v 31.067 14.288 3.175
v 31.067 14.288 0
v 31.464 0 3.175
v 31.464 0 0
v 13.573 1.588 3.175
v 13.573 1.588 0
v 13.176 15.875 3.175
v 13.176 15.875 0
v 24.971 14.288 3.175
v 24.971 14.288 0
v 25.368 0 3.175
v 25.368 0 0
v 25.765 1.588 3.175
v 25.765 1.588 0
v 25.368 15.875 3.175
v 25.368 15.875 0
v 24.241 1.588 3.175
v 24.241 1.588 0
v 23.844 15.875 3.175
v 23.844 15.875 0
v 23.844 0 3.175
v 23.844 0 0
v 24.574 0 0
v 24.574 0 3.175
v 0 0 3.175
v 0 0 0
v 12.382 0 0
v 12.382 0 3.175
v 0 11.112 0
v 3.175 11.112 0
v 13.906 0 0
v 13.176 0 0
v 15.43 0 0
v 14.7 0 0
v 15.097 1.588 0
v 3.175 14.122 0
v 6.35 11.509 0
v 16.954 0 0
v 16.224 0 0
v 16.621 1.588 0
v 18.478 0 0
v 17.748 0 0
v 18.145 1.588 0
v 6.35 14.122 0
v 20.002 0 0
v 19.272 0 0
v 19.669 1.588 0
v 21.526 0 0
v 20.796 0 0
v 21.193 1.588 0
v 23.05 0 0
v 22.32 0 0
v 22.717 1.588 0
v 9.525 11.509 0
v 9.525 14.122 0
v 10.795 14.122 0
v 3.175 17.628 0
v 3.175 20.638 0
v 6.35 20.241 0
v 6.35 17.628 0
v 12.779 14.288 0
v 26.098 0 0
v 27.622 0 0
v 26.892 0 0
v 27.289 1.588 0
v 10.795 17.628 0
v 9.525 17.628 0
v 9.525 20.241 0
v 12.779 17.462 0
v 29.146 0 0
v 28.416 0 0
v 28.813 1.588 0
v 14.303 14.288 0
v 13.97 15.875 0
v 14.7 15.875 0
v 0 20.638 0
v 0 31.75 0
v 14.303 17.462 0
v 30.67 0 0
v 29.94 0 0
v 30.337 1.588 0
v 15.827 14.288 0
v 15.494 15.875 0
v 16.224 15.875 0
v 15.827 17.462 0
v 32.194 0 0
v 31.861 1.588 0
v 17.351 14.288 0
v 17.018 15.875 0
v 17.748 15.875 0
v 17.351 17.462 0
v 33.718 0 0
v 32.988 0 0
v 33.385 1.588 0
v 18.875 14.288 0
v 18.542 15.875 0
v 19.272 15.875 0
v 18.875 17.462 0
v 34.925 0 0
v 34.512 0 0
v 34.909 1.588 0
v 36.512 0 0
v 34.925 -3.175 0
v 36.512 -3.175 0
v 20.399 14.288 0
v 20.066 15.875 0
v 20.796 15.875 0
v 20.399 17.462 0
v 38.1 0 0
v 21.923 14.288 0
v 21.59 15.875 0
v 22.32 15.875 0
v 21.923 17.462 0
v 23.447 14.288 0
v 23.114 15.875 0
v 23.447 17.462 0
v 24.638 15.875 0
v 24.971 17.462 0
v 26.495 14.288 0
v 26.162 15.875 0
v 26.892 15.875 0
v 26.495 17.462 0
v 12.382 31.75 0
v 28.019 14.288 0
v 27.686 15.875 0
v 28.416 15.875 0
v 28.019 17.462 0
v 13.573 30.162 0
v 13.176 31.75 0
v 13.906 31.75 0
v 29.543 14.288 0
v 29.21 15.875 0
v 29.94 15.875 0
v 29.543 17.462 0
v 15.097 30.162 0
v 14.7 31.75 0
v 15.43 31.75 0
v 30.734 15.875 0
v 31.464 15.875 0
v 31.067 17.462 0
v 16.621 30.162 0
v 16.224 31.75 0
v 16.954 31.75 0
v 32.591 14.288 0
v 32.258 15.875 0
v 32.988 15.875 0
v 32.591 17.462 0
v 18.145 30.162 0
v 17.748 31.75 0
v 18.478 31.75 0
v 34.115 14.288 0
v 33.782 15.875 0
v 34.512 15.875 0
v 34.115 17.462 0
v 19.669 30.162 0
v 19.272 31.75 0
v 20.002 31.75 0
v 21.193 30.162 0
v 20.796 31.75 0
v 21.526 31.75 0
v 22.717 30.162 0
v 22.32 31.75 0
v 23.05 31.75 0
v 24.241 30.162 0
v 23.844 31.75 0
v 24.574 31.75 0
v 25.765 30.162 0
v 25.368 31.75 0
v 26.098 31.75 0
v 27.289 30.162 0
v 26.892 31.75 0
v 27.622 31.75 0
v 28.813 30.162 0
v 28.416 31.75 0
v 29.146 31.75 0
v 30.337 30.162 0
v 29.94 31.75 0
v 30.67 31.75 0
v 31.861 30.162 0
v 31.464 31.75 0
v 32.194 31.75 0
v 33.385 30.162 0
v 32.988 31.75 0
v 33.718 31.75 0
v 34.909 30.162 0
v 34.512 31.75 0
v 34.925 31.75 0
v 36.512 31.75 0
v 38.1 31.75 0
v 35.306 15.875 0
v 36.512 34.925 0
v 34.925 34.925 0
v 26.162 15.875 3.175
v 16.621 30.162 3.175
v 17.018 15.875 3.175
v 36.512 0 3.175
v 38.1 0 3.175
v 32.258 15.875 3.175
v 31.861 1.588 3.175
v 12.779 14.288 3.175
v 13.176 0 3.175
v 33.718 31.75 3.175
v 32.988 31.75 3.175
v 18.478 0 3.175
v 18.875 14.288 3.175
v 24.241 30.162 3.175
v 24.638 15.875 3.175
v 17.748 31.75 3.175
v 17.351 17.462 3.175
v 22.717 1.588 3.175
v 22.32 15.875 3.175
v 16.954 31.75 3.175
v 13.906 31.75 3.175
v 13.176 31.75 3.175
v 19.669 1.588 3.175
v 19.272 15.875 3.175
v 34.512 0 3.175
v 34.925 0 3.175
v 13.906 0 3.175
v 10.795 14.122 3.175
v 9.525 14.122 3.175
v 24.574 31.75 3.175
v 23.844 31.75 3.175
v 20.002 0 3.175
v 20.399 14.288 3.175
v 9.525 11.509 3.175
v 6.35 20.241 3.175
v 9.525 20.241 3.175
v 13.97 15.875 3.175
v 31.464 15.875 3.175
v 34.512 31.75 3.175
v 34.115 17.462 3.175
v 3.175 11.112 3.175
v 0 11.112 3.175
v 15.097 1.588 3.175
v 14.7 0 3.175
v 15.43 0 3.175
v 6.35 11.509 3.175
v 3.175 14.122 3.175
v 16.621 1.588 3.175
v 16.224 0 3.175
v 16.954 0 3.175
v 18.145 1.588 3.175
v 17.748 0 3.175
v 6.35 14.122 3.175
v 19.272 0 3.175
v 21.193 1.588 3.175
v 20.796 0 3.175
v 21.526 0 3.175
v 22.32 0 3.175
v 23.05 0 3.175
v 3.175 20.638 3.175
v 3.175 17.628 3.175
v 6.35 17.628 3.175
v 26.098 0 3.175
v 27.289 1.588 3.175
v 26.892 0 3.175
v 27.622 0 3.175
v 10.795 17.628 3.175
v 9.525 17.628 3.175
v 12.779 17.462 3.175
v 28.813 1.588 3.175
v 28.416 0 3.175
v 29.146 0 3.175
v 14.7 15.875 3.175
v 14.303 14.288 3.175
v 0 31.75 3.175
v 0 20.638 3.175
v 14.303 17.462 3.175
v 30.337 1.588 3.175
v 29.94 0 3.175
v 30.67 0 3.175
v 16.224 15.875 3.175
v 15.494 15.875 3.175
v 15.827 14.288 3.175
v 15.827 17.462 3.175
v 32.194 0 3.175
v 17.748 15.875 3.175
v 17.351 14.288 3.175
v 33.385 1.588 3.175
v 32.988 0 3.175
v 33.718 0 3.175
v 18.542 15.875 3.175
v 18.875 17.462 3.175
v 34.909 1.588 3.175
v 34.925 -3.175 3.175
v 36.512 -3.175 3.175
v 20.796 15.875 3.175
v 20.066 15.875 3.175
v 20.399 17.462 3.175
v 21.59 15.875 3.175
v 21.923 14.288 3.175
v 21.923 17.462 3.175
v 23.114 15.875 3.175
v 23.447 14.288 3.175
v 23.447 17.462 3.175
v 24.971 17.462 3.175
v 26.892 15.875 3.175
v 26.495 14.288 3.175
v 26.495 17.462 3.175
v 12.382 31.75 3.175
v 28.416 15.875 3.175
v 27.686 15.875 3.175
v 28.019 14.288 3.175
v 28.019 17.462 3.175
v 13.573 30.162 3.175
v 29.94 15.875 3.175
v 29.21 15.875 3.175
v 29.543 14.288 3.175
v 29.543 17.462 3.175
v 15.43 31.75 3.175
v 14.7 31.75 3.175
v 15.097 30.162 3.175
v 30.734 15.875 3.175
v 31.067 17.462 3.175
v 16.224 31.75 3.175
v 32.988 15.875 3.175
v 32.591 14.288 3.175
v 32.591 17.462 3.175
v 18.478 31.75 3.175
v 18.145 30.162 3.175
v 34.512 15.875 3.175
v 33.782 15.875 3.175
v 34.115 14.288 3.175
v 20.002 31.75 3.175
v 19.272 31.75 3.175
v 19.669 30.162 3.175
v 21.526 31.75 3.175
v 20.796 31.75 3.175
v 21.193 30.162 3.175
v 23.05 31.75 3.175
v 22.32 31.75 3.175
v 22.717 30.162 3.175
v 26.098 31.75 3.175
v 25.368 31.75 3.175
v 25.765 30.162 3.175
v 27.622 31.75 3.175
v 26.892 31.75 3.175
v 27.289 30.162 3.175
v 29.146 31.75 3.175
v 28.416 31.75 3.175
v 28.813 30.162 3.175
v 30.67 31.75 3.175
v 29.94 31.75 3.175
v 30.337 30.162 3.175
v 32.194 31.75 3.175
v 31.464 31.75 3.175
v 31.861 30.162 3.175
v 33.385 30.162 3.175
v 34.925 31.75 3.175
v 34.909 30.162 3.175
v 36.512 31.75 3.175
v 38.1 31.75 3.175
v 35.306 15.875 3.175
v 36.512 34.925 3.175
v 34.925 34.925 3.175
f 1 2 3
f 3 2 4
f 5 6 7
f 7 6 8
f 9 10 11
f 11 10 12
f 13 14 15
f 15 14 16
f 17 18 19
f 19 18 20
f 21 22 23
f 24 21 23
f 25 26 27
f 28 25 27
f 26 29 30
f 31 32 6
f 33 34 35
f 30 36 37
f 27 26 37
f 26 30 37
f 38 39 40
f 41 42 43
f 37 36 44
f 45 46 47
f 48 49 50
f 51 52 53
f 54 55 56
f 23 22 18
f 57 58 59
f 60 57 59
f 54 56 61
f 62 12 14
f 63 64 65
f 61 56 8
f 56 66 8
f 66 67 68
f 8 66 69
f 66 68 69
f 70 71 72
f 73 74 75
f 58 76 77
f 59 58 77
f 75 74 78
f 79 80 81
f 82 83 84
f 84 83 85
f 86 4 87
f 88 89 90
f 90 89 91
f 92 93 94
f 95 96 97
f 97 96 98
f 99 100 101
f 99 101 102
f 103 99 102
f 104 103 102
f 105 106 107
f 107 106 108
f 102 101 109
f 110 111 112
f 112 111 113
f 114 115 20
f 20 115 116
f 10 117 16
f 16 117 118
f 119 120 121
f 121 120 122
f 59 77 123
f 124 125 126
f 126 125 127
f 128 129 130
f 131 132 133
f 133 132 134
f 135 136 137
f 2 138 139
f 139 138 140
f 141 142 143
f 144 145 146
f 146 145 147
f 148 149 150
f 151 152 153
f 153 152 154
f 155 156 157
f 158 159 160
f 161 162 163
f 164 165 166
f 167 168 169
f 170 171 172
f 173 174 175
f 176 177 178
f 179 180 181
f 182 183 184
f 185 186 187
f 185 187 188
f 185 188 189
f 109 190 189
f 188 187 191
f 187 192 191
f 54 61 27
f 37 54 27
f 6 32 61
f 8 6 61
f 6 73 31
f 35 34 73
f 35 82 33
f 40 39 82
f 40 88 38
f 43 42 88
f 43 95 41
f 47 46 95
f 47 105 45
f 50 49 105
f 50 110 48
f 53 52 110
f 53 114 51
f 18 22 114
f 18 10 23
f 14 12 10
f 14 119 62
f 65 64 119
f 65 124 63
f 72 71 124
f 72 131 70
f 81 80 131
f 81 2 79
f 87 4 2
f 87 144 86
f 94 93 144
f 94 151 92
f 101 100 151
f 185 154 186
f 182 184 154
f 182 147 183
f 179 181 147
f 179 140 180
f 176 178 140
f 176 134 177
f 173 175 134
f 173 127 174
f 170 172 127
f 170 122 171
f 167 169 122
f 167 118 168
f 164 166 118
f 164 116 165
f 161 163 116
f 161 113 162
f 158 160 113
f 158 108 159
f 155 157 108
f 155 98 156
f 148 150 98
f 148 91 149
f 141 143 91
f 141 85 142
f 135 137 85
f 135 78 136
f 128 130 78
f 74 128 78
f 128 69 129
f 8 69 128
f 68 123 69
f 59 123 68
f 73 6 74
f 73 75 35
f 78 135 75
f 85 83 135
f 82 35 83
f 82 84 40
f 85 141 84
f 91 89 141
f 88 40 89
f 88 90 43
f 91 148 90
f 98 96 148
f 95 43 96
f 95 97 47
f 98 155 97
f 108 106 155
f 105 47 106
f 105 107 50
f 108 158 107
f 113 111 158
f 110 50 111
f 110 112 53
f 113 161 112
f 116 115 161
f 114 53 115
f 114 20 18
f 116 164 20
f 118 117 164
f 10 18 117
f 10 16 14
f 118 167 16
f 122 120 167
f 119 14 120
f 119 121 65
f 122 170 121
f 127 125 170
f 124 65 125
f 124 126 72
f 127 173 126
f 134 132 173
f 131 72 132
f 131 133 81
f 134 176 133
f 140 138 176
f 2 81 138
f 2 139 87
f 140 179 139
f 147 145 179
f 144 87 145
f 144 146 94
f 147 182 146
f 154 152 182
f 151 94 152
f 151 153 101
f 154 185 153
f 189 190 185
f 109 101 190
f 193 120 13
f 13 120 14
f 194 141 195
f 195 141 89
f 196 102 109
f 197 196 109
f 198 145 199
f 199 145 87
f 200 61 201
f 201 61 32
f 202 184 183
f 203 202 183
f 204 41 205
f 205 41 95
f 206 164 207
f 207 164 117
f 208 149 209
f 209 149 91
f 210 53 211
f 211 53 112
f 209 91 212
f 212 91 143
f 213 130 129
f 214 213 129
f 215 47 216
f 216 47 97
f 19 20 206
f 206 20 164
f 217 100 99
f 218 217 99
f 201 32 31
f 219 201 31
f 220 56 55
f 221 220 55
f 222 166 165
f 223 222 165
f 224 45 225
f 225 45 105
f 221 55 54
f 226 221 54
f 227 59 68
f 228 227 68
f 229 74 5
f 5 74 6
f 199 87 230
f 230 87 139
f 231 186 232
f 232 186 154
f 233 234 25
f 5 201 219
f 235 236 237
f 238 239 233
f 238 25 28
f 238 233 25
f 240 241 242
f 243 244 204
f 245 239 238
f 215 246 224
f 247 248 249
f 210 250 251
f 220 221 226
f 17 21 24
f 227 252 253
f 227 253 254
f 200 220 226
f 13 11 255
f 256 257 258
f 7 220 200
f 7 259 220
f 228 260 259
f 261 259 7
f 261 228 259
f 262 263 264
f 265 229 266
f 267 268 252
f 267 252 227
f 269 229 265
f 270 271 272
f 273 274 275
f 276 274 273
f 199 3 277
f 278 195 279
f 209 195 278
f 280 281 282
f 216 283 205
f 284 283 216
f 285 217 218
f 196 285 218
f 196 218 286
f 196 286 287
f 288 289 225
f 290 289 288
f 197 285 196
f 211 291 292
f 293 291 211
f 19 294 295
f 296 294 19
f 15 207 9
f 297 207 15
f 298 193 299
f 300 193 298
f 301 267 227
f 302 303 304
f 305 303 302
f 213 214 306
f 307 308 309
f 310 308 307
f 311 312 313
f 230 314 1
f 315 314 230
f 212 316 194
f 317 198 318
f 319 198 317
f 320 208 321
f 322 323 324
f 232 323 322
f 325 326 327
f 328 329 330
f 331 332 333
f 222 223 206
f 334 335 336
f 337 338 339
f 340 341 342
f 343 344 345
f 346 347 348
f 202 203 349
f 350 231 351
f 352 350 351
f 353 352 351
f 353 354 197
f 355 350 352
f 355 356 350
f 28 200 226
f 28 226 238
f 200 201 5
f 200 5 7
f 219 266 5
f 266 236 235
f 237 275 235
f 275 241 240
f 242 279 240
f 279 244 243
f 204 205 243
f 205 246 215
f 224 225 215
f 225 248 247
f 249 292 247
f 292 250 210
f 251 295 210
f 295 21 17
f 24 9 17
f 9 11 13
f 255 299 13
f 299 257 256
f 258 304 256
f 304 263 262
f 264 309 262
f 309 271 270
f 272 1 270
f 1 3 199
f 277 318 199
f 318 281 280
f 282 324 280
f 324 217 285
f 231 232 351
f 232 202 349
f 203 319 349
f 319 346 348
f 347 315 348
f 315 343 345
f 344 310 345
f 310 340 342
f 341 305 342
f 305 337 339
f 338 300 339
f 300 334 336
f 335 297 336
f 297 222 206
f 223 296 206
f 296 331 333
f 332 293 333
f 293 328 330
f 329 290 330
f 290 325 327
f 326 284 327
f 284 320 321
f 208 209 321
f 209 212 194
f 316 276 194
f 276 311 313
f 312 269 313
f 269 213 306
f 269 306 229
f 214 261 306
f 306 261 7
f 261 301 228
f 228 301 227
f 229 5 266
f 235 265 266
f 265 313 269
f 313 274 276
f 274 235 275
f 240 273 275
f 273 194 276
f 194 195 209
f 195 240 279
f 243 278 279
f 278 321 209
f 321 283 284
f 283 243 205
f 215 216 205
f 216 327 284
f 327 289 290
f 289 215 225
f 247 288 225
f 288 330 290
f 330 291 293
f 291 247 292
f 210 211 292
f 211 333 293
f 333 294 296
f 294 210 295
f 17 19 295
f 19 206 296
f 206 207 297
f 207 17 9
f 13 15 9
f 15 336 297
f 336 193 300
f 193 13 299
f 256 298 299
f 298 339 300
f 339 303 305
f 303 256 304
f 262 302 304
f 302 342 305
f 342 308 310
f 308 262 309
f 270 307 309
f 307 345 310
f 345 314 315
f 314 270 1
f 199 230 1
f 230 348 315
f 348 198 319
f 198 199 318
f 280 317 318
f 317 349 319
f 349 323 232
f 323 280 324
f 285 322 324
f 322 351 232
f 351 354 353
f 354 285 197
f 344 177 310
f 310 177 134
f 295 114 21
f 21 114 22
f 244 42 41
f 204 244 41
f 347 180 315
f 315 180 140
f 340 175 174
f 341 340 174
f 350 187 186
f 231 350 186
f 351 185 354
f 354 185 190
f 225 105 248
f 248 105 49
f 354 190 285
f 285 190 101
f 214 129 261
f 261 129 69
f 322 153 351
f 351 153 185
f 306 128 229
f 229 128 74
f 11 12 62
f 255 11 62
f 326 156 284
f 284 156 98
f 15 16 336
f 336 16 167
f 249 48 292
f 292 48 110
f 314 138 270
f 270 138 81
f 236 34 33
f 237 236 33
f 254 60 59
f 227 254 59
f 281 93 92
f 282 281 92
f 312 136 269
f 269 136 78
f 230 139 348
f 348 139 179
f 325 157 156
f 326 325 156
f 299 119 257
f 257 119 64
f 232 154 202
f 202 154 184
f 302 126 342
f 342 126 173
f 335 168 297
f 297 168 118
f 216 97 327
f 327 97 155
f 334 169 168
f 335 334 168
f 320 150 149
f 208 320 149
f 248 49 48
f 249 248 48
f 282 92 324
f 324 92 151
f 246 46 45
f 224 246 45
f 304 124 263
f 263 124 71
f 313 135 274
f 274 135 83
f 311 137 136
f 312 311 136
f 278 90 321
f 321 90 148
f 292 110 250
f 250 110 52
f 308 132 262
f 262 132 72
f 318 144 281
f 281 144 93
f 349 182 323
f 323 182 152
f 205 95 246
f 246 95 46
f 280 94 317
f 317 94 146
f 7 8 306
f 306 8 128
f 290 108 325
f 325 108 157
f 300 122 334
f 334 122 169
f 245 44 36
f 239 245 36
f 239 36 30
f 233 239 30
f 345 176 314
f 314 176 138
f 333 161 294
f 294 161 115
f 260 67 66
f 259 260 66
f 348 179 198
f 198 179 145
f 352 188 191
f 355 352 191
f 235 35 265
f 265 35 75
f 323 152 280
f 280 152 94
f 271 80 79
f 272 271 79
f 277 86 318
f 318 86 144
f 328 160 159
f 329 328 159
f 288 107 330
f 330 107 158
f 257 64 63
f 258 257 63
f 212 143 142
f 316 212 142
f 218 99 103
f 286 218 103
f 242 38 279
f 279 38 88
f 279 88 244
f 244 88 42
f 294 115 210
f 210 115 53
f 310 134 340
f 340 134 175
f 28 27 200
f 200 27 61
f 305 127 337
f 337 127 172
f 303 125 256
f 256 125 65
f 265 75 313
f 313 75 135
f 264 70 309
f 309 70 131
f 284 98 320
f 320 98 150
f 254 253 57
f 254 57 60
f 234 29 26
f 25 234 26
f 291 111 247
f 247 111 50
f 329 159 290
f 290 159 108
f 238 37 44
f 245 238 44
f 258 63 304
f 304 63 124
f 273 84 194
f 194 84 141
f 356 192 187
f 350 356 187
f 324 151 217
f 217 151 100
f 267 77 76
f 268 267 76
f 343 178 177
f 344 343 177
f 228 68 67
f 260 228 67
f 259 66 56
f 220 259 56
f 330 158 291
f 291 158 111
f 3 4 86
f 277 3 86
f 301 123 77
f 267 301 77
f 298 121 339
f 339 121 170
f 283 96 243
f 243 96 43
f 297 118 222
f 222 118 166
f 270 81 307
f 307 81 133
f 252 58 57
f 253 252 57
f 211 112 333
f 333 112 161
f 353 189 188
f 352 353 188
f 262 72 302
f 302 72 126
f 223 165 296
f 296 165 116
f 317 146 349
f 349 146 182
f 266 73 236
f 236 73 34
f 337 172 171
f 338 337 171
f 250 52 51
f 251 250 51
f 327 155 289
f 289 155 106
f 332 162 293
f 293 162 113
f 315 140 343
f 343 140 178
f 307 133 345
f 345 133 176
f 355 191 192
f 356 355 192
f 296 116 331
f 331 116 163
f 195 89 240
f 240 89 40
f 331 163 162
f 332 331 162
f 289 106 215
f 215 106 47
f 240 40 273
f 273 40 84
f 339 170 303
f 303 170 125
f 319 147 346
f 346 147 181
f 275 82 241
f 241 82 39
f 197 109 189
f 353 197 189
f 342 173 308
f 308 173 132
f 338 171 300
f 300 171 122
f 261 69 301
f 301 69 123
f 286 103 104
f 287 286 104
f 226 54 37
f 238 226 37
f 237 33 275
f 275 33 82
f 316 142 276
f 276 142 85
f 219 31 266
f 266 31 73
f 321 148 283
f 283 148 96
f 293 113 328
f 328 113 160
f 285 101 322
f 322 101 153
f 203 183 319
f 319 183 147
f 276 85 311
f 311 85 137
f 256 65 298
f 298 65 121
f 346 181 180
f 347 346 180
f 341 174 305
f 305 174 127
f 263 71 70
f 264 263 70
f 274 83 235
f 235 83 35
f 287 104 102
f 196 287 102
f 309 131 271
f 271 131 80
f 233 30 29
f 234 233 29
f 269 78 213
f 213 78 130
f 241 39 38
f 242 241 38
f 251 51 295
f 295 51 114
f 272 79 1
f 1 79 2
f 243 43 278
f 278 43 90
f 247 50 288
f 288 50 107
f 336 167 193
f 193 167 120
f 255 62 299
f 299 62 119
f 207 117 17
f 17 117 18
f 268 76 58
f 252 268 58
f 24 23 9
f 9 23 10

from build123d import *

# Parameters (mm, degrees)
BOSS_EXTRUDE2_DEPTH = 3.175


with BuildPart() as part:
    # Sketch1 → Boss-Extrude2 (new body)
    with BuildSketch(Plane.XY):
        Polygon((3.175, 20.6375), (3.175, 17.6276), (6.35, 17.6276), (6.35, 20.240625), (9.525, 20.240625), (9.525, 17.6276), (10.795, 17.6276), (10.795, 14.1224), (9.525, 14.1224), (9.525, 11.509375), (6.35, 11.509375), (6.35, 14.1224), (3.175, 14.1224), (3.175, 11.1125), (0, 11.1125), (0, 0), (12.3825, 0), (12.779375, 14.2875), (13.17625, 0), (13.9065, 0), (14.303375, 14.2875), (14.70025, 0), (15.4305, 0), (15.827375, 14.2875), (16.22425, 0), (16.9545, 0), (17.351375, 14.2875), (17.74825, 0), (18.4785, 0), (18.875375, 14.2875), (19.27225, 0), (20.0025, 0), (20.399375, 14.2875), (20.79625, 0), (21.5265, 0), (21.923375, 14.2875), (22.32025, 0), (23.0505, 0), (23.447375, 14.2875), (23.84425, 0), (24.5745, 0), (24.971375, 14.2875), (25.36825, 0), (26.0985, 0), (26.495375, 14.2875), (26.89225, 0), (27.6225, 0), (28.019375, 14.2875), (28.41625, 0), (29.1465, 0), (29.543375, 14.2875), (29.94025, 0), (30.6705, 0), (31.067375, 14.2875), (31.46425, 0), (32.1945, 0), (32.591375, 14.2875), (32.98825, 0), (33.7185, 0), (34.115375, 14.2875), (34.51225, 0), (34.925, 0), (34.925, -3.175), (36.5125, -3.175), (36.5125, 0), (38.1, 0), (38.1, 31.75), (36.5125, 31.75), (36.5125, 34.925), (34.925, 34.925), (34.925, 31.75), (34.51225, 31.75), (34.115375, 17.4625), (33.7185, 31.75), (32.98825, 31.75), (32.591375, 17.4625), (32.1945, 31.75), (31.46425, 31.75), (31.067375, 17.4625), (30.6705, 31.75), (29.94025, 31.75), (29.543375, 17.4625), (29.1465, 31.75), (28.41625, 31.75), (28.019375, 17.4625), (27.6225, 31.75), (26.89225, 31.75), (26.495375, 17.4625), (26.0985, 31.75), (25.36825, 31.75), (24.971375, 17.4625), (24.5745, 31.75), (23.84425, 31.75), (23.447375, 17.4625), (23.0505, 31.75), (22.32025, 31.75), (21.923375, 17.4625), (21.5265, 31.75), (20.79625, 31.75), (20.399375, 17.4625), (20.0025, 31.75), (19.27225, 31.75), (18.875375, 17.4625), (18.4785, 31.75), (17.74825, 31.75), (17.351375, 17.4625), (16.9545, 31.75), (16.22425, 31.75), (15.827375, 17.4625), (15.4305, 31.75), (14.70025, 31.75), (14.303375, 17.4625), (13.9065, 31.75), (13.17625, 31.75), (12.779375, 17.4625), (12.3825, 31.75), (0, 31.75), (0, 20.6375), align=None)
        Polygon((13.17625, 15.875), (13.573125, 30.1625), (13.97, 15.875), (13.573125, 1.5875), align=None, mode=Mode.SUBTRACT)
        Polygon((14.70025, 15.875), (15.097125, 30.1625), (15.494, 15.875), (15.097125, 1.5875), align=None, mode=Mode.SUBTRACT)
        Polygon((16.22425, 15.875), (16.621125, 30.1625), (17.018, 15.875), (16.621125, 1.5875), align=None, mode=Mode.SUBTRACT)
        Polygon((17.74825, 15.875), (18.145125, 30.1625), (18.542, 15.875), (18.145125, 1.5875), align=None, mode=Mode.SUBTRACT)
        Polygon((19.27225, 15.875), (19.669125, 30.1625), (20.066, 15.875), (19.669125, 1.5875), align=None, mode=Mode.SUBTRACT)
        Polygon((20.79625, 15.875), (21.193125, 30.1625), (21.59, 15.875), (21.193125, 1.5875), align=None, mode=Mode.SUBTRACT)
        Polygon((22.32025, 15.875), (22.717125, 30.1625), (23.114, 15.875), (22.717125, 1.5875), align=None, mode=Mode.SUBTRACT)
        Polygon((23.84425, 15.875), (24.241125, 30.1625), (24.638, 15.875), (24.241125, 1.5875), align=None, mode=Mode.SUBTRACT)
        Polygon((25.36825, 15.875), (25.765125, 30.1625), (26.162, 15.875), (25.765125, 1.5875), align=None, mode=Mode.SUBTRACT)
        Polygon((26.89225, 15.875), (27.289125, 30.1625), (27.686, 15.875), (27.289125, 1.5875), align=None, mode=Mode.SUBTRACT)
        Polygon((28.41625, 15.875), (28.813125, 30.1625), (29.21, 15.875), (28.813125, 1.5875), align=None, mode=Mode.SUBTRACT)
        Polygon((29.94025, 15.875), (30.337125, 30.1625), (30.734, 15.875), (30.337125, 1.5875), align=None, mode=Mode.SUBTRACT)
        Polygon((31.46425, 15.875), (31.861125, 30.1625), (32.258, 15.875), (31.861125, 1.5875), align=None, mode=Mode.SUBTRACT)
        Polygon((32.98825, 15.875), (33.385125, 30.1625), (33.782, 15.875), (33.385125, 1.5875), align=None, mode=Mode.SUBTRACT)
        Polygon((34.51225, 15.875), (34.909125, 30.1625), (35.306, 15.875), (34.909125, 1.5875), align=None, mode=Mode.SUBTRACT)
    extrude(amount=BOSS_EXTRUDE2_DEPTH)


solid = part.part
